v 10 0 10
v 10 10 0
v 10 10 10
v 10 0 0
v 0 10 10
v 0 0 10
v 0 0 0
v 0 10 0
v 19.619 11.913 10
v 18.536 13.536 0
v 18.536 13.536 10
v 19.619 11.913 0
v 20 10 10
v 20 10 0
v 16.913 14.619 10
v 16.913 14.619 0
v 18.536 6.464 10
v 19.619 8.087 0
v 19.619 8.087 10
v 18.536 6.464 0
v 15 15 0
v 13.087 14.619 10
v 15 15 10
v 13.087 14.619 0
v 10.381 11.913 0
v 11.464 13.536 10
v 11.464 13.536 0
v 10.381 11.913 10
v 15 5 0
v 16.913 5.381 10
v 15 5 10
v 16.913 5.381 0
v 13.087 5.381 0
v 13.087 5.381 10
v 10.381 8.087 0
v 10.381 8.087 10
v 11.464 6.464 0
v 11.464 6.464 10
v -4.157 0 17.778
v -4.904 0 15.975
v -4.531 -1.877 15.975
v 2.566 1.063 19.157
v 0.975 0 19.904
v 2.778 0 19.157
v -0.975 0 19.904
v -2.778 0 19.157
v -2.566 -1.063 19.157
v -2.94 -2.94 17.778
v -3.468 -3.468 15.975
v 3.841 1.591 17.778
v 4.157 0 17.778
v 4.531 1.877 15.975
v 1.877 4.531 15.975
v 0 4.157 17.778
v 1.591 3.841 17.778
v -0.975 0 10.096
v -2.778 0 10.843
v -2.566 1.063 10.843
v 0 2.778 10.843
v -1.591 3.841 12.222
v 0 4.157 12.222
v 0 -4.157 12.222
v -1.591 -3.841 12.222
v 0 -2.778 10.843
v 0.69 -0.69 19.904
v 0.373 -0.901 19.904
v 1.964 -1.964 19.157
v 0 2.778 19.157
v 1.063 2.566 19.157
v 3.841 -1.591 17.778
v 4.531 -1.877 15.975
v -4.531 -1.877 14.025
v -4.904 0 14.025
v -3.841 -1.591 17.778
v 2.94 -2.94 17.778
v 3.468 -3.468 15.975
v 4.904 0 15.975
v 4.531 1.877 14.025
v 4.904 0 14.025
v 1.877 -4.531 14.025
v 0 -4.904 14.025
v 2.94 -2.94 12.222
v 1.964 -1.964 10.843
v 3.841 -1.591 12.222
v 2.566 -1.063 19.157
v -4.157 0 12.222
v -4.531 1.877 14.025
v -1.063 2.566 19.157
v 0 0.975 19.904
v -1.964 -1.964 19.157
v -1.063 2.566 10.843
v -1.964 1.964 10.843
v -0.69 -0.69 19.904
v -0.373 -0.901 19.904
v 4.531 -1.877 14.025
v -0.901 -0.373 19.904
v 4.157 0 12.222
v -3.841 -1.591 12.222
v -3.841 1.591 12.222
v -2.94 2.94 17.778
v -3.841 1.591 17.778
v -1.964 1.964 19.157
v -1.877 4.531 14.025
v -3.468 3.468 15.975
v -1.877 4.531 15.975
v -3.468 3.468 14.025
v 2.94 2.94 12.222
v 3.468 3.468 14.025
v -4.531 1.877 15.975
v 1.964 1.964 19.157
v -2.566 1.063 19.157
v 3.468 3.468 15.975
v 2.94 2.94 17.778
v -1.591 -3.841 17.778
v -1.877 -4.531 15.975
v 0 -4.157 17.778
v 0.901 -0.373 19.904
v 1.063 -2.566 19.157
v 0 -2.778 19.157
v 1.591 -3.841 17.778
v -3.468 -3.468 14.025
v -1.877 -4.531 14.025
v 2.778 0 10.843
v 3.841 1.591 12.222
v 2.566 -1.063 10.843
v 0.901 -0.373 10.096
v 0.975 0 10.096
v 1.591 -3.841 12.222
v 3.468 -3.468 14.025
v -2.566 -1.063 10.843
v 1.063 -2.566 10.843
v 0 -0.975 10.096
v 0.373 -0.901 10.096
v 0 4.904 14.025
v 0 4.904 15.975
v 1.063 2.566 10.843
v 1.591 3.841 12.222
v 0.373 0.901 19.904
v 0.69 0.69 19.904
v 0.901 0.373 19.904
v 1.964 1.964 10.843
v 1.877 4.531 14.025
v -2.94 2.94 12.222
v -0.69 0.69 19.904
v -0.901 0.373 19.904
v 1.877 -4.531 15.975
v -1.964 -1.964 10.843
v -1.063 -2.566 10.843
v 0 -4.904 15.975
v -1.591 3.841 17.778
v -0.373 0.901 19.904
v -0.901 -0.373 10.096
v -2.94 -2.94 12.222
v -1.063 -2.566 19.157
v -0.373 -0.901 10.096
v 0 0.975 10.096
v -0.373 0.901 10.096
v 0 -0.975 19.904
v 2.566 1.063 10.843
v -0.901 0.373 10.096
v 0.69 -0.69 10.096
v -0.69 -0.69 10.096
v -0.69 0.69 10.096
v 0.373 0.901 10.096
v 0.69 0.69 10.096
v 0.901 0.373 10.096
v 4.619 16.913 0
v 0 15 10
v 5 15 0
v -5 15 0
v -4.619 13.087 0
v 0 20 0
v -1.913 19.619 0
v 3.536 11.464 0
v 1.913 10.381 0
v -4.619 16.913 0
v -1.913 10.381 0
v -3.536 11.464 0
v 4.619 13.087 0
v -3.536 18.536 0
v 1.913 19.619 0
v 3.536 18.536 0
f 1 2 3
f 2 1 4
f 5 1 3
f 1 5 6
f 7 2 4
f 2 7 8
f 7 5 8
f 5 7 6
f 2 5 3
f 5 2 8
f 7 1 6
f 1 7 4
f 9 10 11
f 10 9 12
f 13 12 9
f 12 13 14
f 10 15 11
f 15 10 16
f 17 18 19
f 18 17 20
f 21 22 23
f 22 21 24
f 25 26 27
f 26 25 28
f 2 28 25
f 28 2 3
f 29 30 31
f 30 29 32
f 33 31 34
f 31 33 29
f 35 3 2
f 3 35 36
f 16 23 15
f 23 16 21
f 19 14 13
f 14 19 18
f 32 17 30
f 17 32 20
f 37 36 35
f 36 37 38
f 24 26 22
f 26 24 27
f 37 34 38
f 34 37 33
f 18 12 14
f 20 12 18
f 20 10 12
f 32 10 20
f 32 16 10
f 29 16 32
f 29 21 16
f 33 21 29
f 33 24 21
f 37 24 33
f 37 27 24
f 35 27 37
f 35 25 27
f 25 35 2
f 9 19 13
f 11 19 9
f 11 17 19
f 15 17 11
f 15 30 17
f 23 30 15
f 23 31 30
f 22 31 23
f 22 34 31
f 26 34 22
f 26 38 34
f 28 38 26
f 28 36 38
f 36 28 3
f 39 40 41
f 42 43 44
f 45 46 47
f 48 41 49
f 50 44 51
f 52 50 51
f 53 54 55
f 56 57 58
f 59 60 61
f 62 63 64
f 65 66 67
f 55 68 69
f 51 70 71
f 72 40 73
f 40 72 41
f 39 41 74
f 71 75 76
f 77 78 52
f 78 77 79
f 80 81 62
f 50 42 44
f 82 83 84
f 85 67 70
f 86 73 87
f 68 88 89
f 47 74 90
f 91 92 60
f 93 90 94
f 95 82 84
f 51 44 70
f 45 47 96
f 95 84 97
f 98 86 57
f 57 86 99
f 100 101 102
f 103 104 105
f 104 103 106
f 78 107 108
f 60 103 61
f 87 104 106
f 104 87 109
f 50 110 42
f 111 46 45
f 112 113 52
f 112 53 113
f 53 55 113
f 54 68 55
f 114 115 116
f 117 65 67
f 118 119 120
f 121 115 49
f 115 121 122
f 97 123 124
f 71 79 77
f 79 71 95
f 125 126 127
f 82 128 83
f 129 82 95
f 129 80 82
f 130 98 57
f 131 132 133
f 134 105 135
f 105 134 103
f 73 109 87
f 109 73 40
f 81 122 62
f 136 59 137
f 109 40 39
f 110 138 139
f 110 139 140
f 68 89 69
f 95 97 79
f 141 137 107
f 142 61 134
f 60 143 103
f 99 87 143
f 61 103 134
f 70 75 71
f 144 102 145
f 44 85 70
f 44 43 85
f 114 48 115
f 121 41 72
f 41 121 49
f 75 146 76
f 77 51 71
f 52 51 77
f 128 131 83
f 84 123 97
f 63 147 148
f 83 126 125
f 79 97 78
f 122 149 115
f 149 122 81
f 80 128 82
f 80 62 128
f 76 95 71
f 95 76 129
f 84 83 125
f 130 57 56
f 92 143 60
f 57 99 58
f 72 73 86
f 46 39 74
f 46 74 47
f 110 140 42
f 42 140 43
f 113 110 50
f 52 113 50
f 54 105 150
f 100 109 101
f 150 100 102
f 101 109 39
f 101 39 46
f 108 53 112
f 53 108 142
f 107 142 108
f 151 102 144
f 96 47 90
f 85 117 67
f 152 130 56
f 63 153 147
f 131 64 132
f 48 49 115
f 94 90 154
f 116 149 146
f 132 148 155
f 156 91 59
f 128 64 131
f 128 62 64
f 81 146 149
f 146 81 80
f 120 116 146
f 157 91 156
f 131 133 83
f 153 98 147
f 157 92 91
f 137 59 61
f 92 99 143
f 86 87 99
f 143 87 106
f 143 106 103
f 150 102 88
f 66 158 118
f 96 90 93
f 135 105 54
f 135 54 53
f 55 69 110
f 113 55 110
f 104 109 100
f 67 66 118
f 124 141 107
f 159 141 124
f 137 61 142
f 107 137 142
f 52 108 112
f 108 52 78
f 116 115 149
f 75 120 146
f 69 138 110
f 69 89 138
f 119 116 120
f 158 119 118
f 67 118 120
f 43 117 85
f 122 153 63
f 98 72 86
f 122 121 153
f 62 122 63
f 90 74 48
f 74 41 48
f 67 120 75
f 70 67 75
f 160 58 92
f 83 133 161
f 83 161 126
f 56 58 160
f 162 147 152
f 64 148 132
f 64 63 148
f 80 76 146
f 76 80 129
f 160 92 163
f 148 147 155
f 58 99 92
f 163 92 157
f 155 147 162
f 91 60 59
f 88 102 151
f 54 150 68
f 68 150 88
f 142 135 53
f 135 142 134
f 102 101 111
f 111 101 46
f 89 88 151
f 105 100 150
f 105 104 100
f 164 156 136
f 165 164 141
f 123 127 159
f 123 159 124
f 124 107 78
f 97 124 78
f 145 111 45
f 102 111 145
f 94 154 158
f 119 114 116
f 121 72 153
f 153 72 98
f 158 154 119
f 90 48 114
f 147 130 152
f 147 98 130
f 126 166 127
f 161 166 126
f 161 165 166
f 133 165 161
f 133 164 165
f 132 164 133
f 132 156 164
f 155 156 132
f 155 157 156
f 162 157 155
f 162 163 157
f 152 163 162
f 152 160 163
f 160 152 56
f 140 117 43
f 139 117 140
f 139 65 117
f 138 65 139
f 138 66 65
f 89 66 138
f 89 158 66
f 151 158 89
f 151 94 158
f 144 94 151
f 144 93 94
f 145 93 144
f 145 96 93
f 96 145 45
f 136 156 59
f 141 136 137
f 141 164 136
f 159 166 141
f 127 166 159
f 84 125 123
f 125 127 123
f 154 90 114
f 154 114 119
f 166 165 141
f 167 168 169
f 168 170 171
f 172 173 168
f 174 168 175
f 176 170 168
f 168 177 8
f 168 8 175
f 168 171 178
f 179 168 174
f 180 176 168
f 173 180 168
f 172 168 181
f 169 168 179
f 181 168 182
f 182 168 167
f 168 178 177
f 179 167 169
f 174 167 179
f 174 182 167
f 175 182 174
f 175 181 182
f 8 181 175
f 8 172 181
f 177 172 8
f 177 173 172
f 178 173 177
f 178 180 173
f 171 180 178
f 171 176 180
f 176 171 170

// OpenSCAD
/* OpenSCAD Workshop

Example showing 3D primitives and transforms.

*/

//We can create a cube 10x10x10mm.
cube([10,10,10]);


/*Cylinder radius of 5 and height of 10 translated to [15,10,0].
  Note how a cylinder is oriented by default (temporarily remove the translation if you don't know)
*/
translate([15,10,0])cylinder(r = 5, h = 10);

//Sphere
translate([0,0,15])sphere(r = 5);

//Cone
translate([0,15,0])cylinder(r1 = 5, r2 = 0, h = 10);

//Cone rotated 
translate([0,15,0])cylinder(r1 = 5, r2 = 0, h = 10);
